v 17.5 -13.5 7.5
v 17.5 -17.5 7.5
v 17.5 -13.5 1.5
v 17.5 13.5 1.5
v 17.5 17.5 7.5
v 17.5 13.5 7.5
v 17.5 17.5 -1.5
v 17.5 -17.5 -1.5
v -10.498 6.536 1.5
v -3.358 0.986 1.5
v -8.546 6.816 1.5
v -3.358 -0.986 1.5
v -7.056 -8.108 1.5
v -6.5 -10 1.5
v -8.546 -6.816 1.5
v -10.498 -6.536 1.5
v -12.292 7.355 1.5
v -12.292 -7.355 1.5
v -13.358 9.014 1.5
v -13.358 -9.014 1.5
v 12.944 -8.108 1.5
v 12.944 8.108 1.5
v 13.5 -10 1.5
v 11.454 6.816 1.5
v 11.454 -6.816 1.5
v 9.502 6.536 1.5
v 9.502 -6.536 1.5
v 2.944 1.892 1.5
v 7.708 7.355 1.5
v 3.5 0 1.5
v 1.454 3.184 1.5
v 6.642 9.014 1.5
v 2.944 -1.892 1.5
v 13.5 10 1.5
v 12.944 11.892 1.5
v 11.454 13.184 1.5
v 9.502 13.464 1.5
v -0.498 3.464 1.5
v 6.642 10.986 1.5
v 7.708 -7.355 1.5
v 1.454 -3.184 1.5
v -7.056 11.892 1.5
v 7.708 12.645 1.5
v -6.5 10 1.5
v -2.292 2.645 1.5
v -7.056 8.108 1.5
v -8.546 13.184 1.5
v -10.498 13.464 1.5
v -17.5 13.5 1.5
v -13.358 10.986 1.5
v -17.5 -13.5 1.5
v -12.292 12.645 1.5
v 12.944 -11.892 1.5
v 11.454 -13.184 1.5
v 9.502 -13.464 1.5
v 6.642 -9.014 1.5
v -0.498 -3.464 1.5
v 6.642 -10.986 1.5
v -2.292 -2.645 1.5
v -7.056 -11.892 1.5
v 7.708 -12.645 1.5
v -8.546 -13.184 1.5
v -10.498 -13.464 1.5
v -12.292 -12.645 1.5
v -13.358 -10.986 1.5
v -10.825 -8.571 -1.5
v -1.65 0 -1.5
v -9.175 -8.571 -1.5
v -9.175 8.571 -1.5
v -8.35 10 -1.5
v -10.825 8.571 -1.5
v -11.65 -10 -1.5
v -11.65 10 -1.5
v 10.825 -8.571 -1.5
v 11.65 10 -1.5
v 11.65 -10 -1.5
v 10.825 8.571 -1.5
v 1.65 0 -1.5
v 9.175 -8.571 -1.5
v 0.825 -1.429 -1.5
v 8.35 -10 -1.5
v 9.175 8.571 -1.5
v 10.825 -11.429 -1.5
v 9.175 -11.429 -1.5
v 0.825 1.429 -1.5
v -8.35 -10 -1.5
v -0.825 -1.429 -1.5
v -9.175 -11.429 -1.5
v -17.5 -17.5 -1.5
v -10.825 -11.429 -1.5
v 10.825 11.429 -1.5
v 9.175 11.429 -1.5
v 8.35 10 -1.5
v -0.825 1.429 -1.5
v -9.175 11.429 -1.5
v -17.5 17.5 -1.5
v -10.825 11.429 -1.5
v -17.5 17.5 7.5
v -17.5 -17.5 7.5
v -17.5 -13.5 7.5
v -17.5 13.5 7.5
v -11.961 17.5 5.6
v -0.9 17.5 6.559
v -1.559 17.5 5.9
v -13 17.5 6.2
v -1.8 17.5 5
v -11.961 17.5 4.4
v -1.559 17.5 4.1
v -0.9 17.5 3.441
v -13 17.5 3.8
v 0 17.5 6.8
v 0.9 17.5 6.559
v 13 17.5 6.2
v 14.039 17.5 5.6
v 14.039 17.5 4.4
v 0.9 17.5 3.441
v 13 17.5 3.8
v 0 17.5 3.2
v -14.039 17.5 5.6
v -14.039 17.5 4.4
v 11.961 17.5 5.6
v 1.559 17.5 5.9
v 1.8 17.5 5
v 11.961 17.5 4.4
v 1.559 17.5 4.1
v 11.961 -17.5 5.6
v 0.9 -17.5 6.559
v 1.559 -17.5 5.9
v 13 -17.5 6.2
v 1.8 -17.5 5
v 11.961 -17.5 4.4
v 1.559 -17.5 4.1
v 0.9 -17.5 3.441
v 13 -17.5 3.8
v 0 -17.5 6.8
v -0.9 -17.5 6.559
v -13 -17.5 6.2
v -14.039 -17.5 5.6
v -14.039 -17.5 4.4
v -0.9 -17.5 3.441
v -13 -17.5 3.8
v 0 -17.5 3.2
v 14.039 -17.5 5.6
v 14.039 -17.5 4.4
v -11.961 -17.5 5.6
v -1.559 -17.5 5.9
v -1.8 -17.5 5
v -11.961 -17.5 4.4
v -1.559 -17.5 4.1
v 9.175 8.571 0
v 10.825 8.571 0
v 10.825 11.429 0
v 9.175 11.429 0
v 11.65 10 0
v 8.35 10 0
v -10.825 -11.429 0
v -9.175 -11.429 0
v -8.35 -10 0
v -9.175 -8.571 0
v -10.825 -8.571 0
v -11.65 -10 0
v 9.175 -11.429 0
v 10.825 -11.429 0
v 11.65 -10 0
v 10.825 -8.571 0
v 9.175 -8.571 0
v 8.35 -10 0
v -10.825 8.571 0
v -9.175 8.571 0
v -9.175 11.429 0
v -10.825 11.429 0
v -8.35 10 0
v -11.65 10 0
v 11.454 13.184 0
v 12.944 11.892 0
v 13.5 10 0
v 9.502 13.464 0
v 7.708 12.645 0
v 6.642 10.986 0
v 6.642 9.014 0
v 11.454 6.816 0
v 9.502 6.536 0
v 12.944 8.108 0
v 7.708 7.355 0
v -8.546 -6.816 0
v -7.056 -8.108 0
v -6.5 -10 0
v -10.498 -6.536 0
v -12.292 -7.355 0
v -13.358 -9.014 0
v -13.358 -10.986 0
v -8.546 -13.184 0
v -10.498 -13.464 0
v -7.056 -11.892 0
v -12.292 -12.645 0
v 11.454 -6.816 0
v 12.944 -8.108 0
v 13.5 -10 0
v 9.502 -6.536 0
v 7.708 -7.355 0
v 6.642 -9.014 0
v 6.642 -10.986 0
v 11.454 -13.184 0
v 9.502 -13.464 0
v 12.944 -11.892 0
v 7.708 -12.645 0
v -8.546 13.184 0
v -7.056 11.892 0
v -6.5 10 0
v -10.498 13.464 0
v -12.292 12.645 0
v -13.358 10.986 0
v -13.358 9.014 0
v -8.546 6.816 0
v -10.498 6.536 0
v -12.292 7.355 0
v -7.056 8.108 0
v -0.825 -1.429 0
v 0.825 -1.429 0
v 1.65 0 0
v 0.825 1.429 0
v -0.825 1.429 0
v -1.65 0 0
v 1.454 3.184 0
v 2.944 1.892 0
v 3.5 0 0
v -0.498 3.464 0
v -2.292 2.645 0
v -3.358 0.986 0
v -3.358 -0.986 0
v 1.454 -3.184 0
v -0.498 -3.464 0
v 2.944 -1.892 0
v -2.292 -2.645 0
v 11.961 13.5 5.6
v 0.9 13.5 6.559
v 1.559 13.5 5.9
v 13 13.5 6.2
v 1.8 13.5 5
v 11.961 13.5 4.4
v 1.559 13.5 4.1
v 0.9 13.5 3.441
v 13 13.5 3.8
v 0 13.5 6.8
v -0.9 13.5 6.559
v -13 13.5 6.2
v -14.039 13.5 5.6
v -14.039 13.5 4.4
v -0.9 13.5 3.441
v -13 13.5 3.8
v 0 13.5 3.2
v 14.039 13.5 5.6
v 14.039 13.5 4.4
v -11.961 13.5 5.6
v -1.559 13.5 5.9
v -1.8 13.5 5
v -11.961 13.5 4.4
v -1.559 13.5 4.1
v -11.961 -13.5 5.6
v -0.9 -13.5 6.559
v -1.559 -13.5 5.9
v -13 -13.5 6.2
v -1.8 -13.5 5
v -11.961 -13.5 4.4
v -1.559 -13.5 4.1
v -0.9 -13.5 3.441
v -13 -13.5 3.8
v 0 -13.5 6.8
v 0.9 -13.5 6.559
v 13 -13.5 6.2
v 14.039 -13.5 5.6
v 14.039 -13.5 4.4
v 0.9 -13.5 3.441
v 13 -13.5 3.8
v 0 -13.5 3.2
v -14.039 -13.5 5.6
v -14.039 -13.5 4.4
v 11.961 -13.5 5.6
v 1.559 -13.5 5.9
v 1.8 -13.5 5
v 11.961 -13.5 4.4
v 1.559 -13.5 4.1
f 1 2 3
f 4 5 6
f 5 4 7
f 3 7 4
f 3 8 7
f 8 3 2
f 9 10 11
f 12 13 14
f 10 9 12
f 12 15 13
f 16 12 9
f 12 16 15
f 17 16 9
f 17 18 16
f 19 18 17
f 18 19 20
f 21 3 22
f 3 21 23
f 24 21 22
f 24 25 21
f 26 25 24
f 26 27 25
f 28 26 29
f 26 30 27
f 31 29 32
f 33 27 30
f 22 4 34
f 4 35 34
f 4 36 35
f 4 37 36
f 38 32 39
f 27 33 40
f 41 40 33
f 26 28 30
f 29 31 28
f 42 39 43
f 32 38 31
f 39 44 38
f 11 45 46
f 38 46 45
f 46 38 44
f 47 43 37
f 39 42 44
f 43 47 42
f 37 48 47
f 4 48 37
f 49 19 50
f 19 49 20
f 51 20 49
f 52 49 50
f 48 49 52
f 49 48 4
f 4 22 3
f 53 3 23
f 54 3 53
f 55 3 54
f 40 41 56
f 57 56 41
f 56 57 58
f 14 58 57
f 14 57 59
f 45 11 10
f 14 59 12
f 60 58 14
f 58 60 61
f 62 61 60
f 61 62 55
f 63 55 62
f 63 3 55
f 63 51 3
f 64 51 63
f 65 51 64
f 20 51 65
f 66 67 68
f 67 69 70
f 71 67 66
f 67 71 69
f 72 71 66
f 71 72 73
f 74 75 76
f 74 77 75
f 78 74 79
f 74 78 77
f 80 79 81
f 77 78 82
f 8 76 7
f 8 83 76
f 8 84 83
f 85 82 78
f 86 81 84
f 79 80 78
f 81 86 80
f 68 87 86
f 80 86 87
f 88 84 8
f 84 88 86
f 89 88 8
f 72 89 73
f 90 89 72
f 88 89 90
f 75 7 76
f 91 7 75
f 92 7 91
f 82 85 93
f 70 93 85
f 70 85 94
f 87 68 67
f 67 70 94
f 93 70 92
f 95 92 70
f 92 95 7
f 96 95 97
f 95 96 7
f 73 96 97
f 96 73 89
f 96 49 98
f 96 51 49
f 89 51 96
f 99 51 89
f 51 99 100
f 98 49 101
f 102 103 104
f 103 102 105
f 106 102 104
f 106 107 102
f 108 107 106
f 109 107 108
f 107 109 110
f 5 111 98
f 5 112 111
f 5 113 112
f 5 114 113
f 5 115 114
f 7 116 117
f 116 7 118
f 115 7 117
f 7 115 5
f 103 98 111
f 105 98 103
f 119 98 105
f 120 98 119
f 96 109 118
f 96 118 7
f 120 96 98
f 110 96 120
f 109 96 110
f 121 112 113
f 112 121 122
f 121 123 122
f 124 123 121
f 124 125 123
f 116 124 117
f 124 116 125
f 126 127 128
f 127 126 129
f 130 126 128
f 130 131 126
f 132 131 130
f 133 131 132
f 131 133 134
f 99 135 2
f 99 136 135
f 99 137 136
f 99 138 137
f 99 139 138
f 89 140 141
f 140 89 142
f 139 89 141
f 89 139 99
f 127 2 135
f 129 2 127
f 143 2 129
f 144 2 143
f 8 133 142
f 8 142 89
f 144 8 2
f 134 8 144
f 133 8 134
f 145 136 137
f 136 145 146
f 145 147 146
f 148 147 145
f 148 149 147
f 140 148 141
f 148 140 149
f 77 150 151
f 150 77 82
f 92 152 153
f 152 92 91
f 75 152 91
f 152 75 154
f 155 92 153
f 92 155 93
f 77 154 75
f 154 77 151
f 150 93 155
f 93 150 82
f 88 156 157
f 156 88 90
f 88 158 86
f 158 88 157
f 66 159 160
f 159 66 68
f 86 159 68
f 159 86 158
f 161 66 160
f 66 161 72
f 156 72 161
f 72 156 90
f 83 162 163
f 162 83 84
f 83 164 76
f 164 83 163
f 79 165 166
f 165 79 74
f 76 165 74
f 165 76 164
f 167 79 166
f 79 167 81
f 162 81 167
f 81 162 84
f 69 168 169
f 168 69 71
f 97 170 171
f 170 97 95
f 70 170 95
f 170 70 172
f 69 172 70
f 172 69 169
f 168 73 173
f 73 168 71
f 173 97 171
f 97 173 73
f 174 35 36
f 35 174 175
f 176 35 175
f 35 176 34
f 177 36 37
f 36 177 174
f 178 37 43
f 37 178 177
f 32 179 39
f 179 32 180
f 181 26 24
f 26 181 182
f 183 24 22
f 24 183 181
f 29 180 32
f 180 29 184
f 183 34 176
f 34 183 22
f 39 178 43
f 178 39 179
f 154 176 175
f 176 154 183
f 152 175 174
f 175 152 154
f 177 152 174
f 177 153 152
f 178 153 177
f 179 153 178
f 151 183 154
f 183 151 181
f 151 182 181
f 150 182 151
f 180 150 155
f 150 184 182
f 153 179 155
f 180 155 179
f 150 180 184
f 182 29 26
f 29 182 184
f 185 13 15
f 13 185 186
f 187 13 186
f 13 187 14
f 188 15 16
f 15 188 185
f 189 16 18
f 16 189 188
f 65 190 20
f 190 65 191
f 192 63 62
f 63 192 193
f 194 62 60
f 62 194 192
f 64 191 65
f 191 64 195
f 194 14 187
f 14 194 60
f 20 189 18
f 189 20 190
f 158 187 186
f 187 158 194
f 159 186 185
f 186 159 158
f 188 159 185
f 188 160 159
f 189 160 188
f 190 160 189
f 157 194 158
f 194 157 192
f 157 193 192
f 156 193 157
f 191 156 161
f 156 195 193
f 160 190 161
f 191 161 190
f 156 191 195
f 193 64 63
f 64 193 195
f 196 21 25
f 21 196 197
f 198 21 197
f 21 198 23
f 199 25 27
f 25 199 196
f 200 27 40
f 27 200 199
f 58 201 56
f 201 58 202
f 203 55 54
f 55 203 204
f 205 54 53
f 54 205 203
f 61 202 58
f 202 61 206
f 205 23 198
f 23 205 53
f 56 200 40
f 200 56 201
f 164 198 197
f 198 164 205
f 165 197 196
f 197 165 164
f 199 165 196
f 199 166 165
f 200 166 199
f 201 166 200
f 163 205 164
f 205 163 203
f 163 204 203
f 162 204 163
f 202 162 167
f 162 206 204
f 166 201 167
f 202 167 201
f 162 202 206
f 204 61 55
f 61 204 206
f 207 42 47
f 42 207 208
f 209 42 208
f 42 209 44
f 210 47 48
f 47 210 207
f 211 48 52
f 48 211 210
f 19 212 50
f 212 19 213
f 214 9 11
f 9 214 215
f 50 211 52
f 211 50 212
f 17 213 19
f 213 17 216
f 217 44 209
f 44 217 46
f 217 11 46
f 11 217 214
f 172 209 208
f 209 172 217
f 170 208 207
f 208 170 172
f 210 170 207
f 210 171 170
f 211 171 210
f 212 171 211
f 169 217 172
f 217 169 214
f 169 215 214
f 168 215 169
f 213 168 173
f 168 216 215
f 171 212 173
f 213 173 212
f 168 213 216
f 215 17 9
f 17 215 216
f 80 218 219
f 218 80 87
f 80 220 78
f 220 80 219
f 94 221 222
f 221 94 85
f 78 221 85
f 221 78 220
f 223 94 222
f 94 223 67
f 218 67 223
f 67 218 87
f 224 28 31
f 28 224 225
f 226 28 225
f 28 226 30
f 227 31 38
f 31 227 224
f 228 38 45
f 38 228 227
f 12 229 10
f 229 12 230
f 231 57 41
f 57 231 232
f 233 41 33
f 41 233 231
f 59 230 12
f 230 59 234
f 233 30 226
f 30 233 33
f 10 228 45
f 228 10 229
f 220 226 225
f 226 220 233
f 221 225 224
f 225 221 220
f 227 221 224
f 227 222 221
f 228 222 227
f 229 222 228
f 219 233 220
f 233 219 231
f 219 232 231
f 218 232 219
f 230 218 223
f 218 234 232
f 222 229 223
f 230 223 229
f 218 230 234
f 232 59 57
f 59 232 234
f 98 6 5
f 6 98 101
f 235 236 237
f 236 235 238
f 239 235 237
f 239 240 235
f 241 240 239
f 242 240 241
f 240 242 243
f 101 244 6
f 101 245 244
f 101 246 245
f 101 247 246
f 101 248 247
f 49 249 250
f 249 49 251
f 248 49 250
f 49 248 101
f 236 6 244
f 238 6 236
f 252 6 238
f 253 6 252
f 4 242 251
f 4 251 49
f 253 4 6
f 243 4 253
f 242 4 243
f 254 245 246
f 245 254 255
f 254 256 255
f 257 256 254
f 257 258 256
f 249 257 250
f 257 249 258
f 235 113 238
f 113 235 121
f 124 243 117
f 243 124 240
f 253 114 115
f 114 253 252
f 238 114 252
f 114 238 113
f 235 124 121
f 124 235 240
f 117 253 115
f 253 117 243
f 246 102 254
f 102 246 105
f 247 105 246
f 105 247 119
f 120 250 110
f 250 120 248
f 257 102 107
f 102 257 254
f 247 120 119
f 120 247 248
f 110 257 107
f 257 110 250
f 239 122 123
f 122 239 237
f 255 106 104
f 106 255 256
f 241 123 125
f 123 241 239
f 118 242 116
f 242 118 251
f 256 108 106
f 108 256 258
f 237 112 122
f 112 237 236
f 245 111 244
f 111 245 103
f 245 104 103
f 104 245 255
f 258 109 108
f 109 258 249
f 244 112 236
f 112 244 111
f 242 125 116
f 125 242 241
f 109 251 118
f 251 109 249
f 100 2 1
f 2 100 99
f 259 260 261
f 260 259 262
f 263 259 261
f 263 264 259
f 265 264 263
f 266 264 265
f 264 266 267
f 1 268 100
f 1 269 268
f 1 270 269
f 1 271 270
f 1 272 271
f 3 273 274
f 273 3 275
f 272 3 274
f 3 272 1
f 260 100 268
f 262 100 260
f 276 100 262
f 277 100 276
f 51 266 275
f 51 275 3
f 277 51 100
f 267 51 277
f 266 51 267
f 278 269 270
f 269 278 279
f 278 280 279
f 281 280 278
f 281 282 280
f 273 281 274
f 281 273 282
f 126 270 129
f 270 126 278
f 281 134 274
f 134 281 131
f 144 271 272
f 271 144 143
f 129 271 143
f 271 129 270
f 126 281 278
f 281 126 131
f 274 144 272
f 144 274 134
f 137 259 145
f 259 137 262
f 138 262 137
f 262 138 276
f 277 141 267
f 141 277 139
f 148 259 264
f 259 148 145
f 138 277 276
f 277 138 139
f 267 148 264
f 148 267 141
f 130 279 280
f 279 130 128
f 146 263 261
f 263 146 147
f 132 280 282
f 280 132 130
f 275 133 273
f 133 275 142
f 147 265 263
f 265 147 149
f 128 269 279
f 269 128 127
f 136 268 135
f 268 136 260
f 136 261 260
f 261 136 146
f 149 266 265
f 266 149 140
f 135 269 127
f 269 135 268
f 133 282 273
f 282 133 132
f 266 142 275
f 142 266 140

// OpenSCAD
M3 = 1.65;
M3F = 1.8;
M3H = 3.5;
LGR = 1.2;

TYB = 10;
TXB = 10;

module foundation(){
	difference(){
		cube(size=[35,35,3], center=true);

		translate([TXB,TYB,0]) cylinder(r=M3, h=10, center=true);
		translate([-TXB,-TYB,0]) cylinder(r=M3, h=10, center=true);
		translate([TXB,-TYB,0]) cylinder(r=M3, h=10, center=true);
		translate([-TXB,TYB,0]) cylinder(r=M3, h=10, center=true);

		translate([TXB,TYB,1.5]) cylinder(r=M3H, h=3, center=true);
		translate([-TXB,-TYB,1.5]) cylinder(r=M3H, h=3, center=true);
		translate([TXB,-TYB,1.5]) cylinder(r=M3H, h=3, center=true);
		translate([-TXB,TYB,1.5]) cylinder(r=M3H, h=3, center=true);

		cylinder(r=M3, h=10, center=true);
		translate([0,0,1.5]) cylinder(r=3.5, h=3, center=true);

	}
}

module side(){
	difference(){
		cube(size=[35,4,9], center=true);

		translate([13,0,2]) rotate([90,30,0]) cylinder(r=LGR, h=50, $fn=6, center=true);
		translate([-13,0,2]) rotate([90,30,0]) cylinder(r=LGR, h=50, $fn=6, center=true);

		translate([0,0,2]) rotate([90,30,0]) cylinder(r=M3F, h=50, $fn=12, center=true);
	}
}

union(){
	foundation();
	translate([0,15.5,3]) side();
	translate([0,-15.5,3]) side();

}

// +1.5 
// -5.5 + 3 = -2.5
// -2.5 + 11 = 8.5
// -1.5 + 11 = 9.5
//  9.5 - 1.5 = 8
//  9.5 / 2 = 4.75
